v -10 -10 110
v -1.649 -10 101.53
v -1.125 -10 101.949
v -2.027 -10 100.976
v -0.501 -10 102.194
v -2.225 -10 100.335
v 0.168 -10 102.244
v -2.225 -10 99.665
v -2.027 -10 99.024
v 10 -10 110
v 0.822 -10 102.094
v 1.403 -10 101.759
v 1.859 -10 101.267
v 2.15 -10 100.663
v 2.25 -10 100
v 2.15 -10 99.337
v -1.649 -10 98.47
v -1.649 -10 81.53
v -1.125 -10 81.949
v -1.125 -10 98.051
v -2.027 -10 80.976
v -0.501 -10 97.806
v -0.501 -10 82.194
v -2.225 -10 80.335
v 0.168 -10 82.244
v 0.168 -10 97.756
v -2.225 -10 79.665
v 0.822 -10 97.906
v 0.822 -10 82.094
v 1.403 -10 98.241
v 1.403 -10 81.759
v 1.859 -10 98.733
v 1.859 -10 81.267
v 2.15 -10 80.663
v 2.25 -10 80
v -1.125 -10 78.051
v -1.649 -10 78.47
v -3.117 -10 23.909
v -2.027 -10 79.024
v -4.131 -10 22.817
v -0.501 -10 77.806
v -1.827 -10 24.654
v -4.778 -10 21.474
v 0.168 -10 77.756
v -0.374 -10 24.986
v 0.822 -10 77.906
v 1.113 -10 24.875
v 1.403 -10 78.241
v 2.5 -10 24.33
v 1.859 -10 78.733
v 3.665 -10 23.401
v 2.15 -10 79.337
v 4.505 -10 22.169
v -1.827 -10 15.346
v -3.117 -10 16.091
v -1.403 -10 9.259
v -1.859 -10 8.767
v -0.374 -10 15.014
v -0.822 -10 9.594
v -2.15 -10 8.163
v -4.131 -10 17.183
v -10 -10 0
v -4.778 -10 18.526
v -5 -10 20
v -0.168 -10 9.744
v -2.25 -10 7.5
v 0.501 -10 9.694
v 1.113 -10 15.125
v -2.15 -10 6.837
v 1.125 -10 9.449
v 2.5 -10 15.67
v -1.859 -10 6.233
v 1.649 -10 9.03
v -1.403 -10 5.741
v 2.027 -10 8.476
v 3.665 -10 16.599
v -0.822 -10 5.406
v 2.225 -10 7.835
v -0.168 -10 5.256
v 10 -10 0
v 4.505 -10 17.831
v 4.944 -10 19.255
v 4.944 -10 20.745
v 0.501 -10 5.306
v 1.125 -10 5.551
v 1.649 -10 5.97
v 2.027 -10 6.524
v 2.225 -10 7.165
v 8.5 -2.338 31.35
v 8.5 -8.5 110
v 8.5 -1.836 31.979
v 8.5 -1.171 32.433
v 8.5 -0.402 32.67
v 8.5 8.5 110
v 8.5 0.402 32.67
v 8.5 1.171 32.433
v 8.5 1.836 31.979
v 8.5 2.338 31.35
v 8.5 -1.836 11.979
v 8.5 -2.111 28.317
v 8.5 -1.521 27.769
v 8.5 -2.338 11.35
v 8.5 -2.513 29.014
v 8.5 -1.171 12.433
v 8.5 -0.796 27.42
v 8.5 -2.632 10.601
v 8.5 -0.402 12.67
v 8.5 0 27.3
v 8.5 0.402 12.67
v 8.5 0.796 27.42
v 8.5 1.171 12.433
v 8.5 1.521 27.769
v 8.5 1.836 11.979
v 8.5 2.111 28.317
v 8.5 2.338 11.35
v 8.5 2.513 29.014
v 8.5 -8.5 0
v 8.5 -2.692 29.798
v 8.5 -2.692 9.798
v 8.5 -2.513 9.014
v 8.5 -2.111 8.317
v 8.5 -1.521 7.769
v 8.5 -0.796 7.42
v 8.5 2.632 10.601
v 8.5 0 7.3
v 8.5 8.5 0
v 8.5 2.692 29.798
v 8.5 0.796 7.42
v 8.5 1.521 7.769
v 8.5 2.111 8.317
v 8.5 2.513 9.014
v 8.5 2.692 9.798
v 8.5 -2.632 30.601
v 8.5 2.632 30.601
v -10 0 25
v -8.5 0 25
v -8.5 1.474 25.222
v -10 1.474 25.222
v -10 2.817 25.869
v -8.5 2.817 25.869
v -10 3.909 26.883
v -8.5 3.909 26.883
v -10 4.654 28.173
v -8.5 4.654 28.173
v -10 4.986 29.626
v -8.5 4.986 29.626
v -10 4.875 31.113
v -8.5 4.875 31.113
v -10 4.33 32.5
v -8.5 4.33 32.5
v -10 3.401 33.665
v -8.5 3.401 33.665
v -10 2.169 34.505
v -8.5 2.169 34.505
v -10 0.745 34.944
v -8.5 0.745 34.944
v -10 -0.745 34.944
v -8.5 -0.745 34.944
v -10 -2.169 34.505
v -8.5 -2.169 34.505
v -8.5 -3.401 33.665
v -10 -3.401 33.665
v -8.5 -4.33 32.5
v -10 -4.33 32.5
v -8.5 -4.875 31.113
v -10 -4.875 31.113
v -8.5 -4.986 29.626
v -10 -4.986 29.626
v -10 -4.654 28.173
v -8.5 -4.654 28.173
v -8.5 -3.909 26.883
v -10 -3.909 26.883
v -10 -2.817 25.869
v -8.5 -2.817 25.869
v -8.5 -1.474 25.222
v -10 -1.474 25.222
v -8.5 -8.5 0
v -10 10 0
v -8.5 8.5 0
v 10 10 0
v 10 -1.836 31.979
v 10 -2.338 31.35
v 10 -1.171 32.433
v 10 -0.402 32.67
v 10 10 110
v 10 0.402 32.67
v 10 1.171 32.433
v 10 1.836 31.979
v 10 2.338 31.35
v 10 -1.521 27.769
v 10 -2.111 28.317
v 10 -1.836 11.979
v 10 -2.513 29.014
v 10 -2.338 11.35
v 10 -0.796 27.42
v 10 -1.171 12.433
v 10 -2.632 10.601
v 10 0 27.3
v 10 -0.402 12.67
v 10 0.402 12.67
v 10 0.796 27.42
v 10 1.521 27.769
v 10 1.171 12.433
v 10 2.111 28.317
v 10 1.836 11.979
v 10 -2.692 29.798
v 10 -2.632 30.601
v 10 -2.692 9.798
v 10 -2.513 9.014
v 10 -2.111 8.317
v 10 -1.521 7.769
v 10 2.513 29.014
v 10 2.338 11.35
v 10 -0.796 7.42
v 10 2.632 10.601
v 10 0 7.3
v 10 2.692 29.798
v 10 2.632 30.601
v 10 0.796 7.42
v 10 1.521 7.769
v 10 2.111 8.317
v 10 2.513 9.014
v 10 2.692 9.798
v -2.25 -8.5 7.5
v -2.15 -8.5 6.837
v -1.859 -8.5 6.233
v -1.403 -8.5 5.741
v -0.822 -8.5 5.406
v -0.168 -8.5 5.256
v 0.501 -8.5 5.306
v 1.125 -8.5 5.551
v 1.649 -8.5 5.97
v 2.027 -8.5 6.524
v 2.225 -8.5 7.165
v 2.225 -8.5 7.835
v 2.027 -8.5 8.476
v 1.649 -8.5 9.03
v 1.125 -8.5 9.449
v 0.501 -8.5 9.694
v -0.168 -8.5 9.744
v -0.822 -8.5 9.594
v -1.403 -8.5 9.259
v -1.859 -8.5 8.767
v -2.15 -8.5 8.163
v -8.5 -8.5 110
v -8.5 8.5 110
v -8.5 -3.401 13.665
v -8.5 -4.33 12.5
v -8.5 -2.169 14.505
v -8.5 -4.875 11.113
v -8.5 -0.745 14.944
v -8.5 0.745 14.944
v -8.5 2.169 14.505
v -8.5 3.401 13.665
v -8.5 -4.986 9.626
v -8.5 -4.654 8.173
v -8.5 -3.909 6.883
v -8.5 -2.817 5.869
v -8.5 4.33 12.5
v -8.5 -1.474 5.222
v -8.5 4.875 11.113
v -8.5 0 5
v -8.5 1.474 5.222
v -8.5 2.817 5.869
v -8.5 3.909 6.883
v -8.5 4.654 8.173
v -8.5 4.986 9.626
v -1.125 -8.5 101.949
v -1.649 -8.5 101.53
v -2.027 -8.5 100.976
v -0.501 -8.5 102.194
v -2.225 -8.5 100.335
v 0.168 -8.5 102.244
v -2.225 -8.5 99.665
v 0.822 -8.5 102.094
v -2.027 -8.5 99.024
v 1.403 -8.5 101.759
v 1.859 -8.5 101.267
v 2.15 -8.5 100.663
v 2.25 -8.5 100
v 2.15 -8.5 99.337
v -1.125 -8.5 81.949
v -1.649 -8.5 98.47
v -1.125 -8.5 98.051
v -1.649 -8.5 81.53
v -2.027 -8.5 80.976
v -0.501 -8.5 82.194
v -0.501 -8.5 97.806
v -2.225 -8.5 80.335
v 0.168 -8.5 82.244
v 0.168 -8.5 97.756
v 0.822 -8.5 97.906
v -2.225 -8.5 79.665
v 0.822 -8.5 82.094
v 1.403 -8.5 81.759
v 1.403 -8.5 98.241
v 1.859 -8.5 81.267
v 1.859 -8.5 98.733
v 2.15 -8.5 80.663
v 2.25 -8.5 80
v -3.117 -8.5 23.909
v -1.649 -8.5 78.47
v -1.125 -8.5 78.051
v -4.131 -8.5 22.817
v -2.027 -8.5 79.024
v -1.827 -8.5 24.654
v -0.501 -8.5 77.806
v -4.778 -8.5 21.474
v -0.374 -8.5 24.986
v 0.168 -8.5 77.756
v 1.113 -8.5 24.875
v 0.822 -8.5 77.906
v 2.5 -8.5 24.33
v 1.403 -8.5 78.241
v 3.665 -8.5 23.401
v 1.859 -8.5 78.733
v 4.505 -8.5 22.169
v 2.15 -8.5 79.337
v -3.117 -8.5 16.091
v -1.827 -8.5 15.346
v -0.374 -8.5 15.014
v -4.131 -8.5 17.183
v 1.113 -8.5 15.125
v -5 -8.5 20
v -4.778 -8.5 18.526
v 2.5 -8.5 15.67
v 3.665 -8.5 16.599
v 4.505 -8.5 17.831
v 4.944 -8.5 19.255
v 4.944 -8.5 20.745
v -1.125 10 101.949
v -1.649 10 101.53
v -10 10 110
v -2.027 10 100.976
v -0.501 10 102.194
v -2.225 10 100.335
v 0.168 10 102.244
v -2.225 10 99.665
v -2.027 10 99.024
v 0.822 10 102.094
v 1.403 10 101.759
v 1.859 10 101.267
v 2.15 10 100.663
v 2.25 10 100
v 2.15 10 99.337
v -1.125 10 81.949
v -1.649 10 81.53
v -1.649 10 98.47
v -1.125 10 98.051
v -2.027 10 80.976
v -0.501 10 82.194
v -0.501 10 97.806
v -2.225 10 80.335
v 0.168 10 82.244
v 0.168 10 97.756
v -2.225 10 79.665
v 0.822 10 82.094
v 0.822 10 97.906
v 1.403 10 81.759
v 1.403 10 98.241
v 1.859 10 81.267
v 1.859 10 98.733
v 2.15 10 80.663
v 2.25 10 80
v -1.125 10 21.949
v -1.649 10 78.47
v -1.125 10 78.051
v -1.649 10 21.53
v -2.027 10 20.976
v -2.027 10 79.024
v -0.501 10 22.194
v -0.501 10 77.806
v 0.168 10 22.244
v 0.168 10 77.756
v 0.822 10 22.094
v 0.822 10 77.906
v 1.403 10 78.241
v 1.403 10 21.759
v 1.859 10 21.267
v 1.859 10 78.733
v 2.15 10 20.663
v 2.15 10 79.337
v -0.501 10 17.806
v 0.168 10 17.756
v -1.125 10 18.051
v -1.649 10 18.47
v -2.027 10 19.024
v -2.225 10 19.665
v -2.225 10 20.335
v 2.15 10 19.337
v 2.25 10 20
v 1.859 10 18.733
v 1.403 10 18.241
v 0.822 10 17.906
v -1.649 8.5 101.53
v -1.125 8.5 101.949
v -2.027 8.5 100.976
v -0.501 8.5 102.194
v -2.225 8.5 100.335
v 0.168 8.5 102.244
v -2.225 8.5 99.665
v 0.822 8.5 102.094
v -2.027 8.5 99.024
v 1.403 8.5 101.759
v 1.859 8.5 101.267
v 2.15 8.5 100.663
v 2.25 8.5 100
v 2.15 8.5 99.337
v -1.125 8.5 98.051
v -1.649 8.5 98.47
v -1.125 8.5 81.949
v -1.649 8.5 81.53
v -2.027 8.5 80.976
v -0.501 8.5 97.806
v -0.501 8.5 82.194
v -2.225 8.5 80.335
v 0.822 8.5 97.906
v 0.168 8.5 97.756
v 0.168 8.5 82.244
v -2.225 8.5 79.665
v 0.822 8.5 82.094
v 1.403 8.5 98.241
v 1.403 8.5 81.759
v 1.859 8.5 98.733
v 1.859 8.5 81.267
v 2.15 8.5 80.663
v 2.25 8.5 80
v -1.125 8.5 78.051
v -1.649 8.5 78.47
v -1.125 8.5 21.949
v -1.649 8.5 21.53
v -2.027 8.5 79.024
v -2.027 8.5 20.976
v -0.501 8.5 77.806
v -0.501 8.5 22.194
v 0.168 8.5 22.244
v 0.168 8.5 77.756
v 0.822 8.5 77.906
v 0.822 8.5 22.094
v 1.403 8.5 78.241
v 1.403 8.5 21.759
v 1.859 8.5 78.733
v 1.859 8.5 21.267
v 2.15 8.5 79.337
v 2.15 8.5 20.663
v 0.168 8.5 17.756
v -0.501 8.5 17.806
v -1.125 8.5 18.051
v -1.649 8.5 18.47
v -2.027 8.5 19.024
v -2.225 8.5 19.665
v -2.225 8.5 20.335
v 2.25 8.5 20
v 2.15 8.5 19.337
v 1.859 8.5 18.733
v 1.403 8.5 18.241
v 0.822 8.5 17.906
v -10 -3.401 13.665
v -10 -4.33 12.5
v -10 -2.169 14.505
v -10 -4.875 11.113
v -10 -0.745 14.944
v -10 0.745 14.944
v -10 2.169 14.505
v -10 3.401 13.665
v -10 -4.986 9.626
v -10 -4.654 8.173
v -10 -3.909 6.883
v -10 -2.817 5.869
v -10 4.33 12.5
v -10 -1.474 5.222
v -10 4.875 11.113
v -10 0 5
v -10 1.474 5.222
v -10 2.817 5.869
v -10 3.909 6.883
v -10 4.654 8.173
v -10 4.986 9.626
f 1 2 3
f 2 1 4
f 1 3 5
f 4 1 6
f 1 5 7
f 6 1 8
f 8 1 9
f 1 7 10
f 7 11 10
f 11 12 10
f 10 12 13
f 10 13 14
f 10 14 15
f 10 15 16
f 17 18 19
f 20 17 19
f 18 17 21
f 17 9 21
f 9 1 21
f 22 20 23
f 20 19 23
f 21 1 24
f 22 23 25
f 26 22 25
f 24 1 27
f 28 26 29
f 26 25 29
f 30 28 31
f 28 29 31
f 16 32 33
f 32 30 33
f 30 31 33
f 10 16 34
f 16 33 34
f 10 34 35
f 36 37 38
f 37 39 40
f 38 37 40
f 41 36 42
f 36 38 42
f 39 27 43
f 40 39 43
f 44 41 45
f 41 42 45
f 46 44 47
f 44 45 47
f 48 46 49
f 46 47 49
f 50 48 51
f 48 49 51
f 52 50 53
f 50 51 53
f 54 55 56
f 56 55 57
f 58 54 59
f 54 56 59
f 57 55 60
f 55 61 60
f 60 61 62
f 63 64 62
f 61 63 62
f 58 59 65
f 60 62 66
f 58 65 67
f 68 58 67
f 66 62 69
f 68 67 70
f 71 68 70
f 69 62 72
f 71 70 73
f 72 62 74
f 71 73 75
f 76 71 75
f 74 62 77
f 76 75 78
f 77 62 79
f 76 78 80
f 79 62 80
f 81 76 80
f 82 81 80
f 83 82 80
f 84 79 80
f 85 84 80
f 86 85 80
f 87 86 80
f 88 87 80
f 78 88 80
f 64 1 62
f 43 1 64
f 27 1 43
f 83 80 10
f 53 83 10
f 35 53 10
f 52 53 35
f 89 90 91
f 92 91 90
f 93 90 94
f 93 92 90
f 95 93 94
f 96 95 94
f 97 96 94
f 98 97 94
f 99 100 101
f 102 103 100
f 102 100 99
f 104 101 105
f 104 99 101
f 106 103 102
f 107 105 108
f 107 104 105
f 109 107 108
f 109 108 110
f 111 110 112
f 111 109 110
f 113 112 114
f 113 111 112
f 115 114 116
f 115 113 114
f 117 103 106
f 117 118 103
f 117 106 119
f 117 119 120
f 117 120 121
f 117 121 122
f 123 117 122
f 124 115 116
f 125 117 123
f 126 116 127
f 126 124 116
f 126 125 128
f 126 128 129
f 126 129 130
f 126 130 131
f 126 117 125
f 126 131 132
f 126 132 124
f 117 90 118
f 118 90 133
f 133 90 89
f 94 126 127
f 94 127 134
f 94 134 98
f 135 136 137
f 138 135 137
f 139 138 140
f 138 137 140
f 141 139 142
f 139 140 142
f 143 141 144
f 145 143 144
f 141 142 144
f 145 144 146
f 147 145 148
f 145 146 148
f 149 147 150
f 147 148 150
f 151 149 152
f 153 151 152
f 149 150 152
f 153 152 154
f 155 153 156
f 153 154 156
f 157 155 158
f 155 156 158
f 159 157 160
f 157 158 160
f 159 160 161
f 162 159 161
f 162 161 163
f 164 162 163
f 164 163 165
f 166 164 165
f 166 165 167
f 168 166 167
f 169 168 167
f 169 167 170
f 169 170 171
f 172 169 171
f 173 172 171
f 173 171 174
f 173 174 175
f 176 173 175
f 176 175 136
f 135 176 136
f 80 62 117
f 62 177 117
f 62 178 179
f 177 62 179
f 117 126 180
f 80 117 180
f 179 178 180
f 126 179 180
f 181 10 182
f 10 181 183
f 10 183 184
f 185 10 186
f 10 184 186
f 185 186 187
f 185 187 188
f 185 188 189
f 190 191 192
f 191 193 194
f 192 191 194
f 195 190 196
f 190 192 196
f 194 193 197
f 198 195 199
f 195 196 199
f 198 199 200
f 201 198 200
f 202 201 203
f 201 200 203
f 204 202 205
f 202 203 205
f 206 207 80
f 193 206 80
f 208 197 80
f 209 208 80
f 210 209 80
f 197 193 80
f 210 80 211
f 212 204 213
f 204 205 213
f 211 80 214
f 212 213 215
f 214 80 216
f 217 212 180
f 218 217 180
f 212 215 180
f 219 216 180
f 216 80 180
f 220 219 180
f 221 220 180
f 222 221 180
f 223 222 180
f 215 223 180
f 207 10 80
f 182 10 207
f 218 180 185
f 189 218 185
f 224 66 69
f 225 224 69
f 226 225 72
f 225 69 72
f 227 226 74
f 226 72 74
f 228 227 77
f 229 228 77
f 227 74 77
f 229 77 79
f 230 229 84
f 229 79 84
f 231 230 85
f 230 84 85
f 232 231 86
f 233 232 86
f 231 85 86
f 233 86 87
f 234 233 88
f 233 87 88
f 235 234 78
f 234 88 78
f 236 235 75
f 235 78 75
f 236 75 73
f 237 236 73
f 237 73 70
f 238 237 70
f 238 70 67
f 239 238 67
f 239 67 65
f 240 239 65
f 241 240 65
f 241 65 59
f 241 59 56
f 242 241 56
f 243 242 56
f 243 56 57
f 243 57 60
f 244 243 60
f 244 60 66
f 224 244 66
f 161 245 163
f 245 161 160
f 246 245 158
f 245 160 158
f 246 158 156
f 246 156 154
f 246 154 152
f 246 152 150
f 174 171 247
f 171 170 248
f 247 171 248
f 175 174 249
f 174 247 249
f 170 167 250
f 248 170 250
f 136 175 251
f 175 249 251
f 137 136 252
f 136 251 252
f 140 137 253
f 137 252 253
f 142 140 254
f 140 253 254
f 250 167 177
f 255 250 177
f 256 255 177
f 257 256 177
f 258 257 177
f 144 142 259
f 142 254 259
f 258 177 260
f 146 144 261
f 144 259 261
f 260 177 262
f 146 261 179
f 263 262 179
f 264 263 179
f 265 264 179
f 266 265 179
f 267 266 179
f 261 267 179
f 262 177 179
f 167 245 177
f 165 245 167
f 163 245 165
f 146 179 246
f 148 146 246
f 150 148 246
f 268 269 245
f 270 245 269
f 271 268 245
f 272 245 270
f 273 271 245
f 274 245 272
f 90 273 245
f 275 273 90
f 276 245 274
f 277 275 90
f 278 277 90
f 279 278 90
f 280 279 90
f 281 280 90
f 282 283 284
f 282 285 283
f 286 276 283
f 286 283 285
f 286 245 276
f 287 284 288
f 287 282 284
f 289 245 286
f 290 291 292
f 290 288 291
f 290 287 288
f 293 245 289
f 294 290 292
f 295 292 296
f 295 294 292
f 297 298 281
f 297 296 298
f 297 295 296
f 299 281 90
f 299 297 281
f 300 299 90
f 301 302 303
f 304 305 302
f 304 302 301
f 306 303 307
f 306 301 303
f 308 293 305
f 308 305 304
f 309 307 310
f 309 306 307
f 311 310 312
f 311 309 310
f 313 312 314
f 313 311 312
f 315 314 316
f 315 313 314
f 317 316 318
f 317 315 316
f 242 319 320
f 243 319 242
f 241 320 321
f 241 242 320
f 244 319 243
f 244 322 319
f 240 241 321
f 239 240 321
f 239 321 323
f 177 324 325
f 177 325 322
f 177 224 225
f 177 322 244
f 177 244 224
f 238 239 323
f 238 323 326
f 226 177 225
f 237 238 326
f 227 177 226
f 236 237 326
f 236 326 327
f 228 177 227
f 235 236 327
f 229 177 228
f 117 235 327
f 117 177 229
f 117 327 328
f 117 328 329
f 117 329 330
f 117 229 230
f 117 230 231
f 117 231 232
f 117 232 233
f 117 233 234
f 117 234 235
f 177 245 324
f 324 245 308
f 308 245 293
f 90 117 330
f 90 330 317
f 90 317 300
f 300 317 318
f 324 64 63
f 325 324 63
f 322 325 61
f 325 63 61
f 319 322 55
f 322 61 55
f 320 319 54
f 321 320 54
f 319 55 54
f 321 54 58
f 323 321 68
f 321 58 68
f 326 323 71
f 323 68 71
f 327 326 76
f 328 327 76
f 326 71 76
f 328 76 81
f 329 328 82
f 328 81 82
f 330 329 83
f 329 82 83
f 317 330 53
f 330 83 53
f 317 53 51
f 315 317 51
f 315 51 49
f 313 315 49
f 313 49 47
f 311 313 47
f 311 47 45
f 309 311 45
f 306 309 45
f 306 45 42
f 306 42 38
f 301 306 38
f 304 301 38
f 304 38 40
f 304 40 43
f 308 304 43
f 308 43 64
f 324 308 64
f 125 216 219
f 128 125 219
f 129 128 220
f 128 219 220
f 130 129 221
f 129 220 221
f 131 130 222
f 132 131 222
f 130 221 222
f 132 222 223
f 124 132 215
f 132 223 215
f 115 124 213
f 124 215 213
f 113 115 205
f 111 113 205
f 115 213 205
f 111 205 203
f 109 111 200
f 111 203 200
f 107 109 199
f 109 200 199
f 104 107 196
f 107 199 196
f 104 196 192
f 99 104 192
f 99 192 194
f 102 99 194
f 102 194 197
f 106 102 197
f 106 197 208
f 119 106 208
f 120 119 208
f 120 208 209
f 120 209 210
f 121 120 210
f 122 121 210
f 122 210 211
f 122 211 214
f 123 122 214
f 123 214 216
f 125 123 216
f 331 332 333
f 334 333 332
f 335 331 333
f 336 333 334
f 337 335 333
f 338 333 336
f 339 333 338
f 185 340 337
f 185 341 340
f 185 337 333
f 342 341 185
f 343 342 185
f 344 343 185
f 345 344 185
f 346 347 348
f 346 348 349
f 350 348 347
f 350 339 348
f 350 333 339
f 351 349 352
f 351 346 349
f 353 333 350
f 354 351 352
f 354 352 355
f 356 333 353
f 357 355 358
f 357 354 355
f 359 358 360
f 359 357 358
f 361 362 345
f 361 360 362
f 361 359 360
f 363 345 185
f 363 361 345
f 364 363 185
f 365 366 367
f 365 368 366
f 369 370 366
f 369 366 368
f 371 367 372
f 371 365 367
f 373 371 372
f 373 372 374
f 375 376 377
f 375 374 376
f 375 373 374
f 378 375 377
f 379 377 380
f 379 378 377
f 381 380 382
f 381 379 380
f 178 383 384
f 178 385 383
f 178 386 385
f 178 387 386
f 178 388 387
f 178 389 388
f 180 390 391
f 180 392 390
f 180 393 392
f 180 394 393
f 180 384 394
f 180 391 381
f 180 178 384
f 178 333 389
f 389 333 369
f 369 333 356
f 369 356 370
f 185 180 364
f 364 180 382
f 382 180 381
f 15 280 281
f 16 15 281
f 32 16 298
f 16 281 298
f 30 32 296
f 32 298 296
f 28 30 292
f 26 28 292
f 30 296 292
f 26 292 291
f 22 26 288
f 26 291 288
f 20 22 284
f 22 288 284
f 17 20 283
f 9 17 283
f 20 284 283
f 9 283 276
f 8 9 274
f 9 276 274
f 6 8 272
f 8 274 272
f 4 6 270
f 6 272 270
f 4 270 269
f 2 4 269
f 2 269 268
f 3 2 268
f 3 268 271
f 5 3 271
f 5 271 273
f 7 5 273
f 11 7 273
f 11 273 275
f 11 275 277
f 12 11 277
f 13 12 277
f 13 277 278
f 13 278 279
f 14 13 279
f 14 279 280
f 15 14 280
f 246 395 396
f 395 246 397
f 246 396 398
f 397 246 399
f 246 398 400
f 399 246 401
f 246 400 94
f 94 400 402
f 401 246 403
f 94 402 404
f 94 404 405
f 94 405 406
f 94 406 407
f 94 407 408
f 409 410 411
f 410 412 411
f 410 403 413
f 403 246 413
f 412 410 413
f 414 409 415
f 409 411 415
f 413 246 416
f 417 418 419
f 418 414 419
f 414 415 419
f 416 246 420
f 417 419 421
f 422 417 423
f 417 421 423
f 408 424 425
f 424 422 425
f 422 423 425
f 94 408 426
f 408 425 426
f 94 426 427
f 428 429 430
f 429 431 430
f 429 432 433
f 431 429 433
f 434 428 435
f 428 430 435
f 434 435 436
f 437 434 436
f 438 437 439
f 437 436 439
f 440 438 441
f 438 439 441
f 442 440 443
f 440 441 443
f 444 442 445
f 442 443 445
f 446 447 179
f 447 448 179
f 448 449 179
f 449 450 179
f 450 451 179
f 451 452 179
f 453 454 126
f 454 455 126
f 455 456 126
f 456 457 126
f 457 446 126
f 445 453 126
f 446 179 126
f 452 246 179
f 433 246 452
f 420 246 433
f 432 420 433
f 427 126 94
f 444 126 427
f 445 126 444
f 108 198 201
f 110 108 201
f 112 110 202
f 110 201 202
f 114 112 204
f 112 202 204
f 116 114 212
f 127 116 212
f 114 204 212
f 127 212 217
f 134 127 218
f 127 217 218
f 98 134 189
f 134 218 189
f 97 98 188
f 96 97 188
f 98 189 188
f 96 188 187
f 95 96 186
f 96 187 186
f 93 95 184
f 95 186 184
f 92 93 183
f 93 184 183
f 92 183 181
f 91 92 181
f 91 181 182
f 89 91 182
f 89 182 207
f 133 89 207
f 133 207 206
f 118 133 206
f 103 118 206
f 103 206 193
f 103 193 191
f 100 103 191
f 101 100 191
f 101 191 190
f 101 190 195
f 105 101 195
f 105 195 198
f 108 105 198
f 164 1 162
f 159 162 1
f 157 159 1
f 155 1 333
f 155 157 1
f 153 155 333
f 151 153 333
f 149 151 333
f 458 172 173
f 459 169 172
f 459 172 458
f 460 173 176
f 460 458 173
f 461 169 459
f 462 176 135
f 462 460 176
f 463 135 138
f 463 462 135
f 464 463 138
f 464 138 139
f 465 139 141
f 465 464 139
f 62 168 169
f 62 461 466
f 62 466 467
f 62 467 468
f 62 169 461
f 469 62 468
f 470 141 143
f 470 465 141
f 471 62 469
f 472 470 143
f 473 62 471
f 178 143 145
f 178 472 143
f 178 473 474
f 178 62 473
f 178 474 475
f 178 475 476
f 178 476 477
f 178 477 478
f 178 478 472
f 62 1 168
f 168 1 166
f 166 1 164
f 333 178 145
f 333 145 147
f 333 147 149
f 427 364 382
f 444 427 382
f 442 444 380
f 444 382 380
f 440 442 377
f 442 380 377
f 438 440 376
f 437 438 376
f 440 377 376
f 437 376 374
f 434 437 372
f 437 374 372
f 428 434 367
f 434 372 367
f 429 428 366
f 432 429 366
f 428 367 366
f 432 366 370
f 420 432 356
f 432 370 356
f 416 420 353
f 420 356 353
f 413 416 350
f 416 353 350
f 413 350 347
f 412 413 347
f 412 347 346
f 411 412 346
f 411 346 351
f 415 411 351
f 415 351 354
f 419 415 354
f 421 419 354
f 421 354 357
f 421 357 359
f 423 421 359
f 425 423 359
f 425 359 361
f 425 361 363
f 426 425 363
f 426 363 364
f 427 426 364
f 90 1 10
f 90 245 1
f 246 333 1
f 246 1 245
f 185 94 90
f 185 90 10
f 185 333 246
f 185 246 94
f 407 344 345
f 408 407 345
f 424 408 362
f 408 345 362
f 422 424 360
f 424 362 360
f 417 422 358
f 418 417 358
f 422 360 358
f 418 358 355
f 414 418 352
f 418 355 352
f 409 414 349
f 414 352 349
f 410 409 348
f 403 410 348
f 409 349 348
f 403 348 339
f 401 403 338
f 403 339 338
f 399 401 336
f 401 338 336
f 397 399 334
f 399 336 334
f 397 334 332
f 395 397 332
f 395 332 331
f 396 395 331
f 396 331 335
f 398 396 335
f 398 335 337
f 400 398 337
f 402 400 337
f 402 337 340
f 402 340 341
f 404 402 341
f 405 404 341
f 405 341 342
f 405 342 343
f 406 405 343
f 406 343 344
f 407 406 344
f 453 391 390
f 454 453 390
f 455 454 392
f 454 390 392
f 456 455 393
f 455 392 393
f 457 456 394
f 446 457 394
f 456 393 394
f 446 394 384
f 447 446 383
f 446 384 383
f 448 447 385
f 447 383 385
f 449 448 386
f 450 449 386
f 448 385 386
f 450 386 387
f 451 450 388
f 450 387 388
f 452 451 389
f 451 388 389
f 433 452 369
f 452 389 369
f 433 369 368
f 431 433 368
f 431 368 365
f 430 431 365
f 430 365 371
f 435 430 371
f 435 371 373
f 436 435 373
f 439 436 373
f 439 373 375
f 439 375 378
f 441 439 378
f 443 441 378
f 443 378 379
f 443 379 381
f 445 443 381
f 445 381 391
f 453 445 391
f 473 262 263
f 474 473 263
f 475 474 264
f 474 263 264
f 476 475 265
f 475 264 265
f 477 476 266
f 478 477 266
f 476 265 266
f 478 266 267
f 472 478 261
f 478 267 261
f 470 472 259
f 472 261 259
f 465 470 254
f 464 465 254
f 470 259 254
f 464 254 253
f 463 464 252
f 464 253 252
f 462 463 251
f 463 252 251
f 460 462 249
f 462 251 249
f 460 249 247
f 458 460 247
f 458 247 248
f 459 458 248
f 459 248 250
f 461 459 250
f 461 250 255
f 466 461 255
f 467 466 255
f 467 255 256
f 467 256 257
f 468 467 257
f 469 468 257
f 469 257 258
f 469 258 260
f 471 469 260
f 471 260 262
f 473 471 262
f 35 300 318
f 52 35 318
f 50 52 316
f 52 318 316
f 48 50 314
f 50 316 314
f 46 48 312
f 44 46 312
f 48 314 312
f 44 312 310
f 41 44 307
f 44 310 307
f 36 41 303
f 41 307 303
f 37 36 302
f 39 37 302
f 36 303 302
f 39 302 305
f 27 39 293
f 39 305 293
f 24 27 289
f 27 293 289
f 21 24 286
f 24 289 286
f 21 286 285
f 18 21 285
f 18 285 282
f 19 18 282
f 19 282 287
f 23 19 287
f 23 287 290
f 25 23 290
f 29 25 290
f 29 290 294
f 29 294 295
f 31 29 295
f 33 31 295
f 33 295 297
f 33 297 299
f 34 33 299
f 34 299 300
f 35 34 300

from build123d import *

# Parameters (mm, degrees)
SKETCH_1_W          = 20
SKETCH_1_H          = 20
SKETCH_1_W_2        = 17
SKETCH_1_H_2        = 17
EXTRUDE_1_DEPTH     = 110
SKETCH_2_R          = 2.7
CUT_EXTRUDE_1_DEPTH = 25
SKETCH_3_R          = 2.25
CUT_EXTRUDE_2_DEPTH = 20
SKETCH_4_R          = 2.25
CUT_EXTRUDE_3_DEPTH = 5
SKETCH_5_R          = 5
CUT_EXTRUDE_4_DEPTH = 10
CUT_EXTRUDE_START   = -10
SKETCH_6_R          = 5
CUT_EXTRUDE_5_DEPTH = 10


with BuildPart() as part:
    # ｽｹｯﾁ1 → ﾎﾞｽ - 押し出し1 (new body)
    with BuildSketch(Plane.XY):
        Rectangle(SKETCH_1_W, SKETCH_1_H)
        Rectangle(SKETCH_1_W_2, SKETCH_1_H_2, mode=Mode.SUBTRACT)
    extrude(amount=EXTRUDE_1_DEPTH)

    # ｽｹｯﾁ2 → ｶｯﾄ - 押し出し1 (cut)
    with BuildSketch(Plane(origin=(10, 0, 0), x_dir=(0, 0, -1), z_dir=(1, 0, 0))):
        with Locations((-30, 0)):
            Circle(SKETCH_2_R)
        with Locations((-10, 0)):
            Circle(SKETCH_2_R)
    extrude(amount=-CUT_EXTRUDE_1_DEPTH, mode=Mode.SUBTRACT)

    # ｽｹｯﾁ3 → ｶｯﾄ - 押し出し2 (cut)
    with BuildSketch(Plane(origin=(0, 10, 0), x_dir=(1, 0, 0), z_dir=(0, 1, 0))):
        with Locations((0, -100)):
            Circle(SKETCH_3_R)
        with Locations((0, -80)):
            Circle(SKETCH_3_R)
        with Locations((0, -20)):
            Circle(SKETCH_3_R)
    extrude(amount=-CUT_EXTRUDE_2_DEPTH, mode=Mode.SUBTRACT)

    # ｽｹｯﾁ4 → ｶｯﾄ - 押し出し3 (cut)
    with BuildSketch(Plane(origin=(0, -10, 0), x_dir=(-1, 0, 0), z_dir=(0, -1, 0))):
        with Locations((0, -7.5)):
            Circle(SKETCH_4_R)
    extrude(amount=-CUT_EXTRUDE_3_DEPTH, mode=Mode.SUBTRACT)

    # ｽｹｯﾁ5 → ｶｯﾄ - 押し出し4 (cut)
    with BuildSketch(Plane(origin=(0, -10, 0), x_dir=(-1, 0, 0), z_dir=(0, -1, 0))):
        with Locations((0, -20)):
            Circle(SKETCH_5_R)
    extrude(amount=-CUT_EXTRUDE_4_DEPTH, mode=Mode.SUBTRACT)

    # ｽｹｯﾁ6 → ｶｯﾄ - 押し出し5 (cut)
    with BuildSketch(Plane(origin=(10, 0, 0), x_dir=(0, 0, -1), z_dir=(1, 0, 0)).offset(CUT_EXTRUDE_START)):
        with Locations((-10, 0)):
            Circle(SKETCH_6_R)
        with Locations((-30, 0)):
            Circle(SKETCH_6_R)
    extrude(amount=-CUT_EXTRUDE_5_DEPTH, mode=Mode.SUBTRACT)


solid = part.part
